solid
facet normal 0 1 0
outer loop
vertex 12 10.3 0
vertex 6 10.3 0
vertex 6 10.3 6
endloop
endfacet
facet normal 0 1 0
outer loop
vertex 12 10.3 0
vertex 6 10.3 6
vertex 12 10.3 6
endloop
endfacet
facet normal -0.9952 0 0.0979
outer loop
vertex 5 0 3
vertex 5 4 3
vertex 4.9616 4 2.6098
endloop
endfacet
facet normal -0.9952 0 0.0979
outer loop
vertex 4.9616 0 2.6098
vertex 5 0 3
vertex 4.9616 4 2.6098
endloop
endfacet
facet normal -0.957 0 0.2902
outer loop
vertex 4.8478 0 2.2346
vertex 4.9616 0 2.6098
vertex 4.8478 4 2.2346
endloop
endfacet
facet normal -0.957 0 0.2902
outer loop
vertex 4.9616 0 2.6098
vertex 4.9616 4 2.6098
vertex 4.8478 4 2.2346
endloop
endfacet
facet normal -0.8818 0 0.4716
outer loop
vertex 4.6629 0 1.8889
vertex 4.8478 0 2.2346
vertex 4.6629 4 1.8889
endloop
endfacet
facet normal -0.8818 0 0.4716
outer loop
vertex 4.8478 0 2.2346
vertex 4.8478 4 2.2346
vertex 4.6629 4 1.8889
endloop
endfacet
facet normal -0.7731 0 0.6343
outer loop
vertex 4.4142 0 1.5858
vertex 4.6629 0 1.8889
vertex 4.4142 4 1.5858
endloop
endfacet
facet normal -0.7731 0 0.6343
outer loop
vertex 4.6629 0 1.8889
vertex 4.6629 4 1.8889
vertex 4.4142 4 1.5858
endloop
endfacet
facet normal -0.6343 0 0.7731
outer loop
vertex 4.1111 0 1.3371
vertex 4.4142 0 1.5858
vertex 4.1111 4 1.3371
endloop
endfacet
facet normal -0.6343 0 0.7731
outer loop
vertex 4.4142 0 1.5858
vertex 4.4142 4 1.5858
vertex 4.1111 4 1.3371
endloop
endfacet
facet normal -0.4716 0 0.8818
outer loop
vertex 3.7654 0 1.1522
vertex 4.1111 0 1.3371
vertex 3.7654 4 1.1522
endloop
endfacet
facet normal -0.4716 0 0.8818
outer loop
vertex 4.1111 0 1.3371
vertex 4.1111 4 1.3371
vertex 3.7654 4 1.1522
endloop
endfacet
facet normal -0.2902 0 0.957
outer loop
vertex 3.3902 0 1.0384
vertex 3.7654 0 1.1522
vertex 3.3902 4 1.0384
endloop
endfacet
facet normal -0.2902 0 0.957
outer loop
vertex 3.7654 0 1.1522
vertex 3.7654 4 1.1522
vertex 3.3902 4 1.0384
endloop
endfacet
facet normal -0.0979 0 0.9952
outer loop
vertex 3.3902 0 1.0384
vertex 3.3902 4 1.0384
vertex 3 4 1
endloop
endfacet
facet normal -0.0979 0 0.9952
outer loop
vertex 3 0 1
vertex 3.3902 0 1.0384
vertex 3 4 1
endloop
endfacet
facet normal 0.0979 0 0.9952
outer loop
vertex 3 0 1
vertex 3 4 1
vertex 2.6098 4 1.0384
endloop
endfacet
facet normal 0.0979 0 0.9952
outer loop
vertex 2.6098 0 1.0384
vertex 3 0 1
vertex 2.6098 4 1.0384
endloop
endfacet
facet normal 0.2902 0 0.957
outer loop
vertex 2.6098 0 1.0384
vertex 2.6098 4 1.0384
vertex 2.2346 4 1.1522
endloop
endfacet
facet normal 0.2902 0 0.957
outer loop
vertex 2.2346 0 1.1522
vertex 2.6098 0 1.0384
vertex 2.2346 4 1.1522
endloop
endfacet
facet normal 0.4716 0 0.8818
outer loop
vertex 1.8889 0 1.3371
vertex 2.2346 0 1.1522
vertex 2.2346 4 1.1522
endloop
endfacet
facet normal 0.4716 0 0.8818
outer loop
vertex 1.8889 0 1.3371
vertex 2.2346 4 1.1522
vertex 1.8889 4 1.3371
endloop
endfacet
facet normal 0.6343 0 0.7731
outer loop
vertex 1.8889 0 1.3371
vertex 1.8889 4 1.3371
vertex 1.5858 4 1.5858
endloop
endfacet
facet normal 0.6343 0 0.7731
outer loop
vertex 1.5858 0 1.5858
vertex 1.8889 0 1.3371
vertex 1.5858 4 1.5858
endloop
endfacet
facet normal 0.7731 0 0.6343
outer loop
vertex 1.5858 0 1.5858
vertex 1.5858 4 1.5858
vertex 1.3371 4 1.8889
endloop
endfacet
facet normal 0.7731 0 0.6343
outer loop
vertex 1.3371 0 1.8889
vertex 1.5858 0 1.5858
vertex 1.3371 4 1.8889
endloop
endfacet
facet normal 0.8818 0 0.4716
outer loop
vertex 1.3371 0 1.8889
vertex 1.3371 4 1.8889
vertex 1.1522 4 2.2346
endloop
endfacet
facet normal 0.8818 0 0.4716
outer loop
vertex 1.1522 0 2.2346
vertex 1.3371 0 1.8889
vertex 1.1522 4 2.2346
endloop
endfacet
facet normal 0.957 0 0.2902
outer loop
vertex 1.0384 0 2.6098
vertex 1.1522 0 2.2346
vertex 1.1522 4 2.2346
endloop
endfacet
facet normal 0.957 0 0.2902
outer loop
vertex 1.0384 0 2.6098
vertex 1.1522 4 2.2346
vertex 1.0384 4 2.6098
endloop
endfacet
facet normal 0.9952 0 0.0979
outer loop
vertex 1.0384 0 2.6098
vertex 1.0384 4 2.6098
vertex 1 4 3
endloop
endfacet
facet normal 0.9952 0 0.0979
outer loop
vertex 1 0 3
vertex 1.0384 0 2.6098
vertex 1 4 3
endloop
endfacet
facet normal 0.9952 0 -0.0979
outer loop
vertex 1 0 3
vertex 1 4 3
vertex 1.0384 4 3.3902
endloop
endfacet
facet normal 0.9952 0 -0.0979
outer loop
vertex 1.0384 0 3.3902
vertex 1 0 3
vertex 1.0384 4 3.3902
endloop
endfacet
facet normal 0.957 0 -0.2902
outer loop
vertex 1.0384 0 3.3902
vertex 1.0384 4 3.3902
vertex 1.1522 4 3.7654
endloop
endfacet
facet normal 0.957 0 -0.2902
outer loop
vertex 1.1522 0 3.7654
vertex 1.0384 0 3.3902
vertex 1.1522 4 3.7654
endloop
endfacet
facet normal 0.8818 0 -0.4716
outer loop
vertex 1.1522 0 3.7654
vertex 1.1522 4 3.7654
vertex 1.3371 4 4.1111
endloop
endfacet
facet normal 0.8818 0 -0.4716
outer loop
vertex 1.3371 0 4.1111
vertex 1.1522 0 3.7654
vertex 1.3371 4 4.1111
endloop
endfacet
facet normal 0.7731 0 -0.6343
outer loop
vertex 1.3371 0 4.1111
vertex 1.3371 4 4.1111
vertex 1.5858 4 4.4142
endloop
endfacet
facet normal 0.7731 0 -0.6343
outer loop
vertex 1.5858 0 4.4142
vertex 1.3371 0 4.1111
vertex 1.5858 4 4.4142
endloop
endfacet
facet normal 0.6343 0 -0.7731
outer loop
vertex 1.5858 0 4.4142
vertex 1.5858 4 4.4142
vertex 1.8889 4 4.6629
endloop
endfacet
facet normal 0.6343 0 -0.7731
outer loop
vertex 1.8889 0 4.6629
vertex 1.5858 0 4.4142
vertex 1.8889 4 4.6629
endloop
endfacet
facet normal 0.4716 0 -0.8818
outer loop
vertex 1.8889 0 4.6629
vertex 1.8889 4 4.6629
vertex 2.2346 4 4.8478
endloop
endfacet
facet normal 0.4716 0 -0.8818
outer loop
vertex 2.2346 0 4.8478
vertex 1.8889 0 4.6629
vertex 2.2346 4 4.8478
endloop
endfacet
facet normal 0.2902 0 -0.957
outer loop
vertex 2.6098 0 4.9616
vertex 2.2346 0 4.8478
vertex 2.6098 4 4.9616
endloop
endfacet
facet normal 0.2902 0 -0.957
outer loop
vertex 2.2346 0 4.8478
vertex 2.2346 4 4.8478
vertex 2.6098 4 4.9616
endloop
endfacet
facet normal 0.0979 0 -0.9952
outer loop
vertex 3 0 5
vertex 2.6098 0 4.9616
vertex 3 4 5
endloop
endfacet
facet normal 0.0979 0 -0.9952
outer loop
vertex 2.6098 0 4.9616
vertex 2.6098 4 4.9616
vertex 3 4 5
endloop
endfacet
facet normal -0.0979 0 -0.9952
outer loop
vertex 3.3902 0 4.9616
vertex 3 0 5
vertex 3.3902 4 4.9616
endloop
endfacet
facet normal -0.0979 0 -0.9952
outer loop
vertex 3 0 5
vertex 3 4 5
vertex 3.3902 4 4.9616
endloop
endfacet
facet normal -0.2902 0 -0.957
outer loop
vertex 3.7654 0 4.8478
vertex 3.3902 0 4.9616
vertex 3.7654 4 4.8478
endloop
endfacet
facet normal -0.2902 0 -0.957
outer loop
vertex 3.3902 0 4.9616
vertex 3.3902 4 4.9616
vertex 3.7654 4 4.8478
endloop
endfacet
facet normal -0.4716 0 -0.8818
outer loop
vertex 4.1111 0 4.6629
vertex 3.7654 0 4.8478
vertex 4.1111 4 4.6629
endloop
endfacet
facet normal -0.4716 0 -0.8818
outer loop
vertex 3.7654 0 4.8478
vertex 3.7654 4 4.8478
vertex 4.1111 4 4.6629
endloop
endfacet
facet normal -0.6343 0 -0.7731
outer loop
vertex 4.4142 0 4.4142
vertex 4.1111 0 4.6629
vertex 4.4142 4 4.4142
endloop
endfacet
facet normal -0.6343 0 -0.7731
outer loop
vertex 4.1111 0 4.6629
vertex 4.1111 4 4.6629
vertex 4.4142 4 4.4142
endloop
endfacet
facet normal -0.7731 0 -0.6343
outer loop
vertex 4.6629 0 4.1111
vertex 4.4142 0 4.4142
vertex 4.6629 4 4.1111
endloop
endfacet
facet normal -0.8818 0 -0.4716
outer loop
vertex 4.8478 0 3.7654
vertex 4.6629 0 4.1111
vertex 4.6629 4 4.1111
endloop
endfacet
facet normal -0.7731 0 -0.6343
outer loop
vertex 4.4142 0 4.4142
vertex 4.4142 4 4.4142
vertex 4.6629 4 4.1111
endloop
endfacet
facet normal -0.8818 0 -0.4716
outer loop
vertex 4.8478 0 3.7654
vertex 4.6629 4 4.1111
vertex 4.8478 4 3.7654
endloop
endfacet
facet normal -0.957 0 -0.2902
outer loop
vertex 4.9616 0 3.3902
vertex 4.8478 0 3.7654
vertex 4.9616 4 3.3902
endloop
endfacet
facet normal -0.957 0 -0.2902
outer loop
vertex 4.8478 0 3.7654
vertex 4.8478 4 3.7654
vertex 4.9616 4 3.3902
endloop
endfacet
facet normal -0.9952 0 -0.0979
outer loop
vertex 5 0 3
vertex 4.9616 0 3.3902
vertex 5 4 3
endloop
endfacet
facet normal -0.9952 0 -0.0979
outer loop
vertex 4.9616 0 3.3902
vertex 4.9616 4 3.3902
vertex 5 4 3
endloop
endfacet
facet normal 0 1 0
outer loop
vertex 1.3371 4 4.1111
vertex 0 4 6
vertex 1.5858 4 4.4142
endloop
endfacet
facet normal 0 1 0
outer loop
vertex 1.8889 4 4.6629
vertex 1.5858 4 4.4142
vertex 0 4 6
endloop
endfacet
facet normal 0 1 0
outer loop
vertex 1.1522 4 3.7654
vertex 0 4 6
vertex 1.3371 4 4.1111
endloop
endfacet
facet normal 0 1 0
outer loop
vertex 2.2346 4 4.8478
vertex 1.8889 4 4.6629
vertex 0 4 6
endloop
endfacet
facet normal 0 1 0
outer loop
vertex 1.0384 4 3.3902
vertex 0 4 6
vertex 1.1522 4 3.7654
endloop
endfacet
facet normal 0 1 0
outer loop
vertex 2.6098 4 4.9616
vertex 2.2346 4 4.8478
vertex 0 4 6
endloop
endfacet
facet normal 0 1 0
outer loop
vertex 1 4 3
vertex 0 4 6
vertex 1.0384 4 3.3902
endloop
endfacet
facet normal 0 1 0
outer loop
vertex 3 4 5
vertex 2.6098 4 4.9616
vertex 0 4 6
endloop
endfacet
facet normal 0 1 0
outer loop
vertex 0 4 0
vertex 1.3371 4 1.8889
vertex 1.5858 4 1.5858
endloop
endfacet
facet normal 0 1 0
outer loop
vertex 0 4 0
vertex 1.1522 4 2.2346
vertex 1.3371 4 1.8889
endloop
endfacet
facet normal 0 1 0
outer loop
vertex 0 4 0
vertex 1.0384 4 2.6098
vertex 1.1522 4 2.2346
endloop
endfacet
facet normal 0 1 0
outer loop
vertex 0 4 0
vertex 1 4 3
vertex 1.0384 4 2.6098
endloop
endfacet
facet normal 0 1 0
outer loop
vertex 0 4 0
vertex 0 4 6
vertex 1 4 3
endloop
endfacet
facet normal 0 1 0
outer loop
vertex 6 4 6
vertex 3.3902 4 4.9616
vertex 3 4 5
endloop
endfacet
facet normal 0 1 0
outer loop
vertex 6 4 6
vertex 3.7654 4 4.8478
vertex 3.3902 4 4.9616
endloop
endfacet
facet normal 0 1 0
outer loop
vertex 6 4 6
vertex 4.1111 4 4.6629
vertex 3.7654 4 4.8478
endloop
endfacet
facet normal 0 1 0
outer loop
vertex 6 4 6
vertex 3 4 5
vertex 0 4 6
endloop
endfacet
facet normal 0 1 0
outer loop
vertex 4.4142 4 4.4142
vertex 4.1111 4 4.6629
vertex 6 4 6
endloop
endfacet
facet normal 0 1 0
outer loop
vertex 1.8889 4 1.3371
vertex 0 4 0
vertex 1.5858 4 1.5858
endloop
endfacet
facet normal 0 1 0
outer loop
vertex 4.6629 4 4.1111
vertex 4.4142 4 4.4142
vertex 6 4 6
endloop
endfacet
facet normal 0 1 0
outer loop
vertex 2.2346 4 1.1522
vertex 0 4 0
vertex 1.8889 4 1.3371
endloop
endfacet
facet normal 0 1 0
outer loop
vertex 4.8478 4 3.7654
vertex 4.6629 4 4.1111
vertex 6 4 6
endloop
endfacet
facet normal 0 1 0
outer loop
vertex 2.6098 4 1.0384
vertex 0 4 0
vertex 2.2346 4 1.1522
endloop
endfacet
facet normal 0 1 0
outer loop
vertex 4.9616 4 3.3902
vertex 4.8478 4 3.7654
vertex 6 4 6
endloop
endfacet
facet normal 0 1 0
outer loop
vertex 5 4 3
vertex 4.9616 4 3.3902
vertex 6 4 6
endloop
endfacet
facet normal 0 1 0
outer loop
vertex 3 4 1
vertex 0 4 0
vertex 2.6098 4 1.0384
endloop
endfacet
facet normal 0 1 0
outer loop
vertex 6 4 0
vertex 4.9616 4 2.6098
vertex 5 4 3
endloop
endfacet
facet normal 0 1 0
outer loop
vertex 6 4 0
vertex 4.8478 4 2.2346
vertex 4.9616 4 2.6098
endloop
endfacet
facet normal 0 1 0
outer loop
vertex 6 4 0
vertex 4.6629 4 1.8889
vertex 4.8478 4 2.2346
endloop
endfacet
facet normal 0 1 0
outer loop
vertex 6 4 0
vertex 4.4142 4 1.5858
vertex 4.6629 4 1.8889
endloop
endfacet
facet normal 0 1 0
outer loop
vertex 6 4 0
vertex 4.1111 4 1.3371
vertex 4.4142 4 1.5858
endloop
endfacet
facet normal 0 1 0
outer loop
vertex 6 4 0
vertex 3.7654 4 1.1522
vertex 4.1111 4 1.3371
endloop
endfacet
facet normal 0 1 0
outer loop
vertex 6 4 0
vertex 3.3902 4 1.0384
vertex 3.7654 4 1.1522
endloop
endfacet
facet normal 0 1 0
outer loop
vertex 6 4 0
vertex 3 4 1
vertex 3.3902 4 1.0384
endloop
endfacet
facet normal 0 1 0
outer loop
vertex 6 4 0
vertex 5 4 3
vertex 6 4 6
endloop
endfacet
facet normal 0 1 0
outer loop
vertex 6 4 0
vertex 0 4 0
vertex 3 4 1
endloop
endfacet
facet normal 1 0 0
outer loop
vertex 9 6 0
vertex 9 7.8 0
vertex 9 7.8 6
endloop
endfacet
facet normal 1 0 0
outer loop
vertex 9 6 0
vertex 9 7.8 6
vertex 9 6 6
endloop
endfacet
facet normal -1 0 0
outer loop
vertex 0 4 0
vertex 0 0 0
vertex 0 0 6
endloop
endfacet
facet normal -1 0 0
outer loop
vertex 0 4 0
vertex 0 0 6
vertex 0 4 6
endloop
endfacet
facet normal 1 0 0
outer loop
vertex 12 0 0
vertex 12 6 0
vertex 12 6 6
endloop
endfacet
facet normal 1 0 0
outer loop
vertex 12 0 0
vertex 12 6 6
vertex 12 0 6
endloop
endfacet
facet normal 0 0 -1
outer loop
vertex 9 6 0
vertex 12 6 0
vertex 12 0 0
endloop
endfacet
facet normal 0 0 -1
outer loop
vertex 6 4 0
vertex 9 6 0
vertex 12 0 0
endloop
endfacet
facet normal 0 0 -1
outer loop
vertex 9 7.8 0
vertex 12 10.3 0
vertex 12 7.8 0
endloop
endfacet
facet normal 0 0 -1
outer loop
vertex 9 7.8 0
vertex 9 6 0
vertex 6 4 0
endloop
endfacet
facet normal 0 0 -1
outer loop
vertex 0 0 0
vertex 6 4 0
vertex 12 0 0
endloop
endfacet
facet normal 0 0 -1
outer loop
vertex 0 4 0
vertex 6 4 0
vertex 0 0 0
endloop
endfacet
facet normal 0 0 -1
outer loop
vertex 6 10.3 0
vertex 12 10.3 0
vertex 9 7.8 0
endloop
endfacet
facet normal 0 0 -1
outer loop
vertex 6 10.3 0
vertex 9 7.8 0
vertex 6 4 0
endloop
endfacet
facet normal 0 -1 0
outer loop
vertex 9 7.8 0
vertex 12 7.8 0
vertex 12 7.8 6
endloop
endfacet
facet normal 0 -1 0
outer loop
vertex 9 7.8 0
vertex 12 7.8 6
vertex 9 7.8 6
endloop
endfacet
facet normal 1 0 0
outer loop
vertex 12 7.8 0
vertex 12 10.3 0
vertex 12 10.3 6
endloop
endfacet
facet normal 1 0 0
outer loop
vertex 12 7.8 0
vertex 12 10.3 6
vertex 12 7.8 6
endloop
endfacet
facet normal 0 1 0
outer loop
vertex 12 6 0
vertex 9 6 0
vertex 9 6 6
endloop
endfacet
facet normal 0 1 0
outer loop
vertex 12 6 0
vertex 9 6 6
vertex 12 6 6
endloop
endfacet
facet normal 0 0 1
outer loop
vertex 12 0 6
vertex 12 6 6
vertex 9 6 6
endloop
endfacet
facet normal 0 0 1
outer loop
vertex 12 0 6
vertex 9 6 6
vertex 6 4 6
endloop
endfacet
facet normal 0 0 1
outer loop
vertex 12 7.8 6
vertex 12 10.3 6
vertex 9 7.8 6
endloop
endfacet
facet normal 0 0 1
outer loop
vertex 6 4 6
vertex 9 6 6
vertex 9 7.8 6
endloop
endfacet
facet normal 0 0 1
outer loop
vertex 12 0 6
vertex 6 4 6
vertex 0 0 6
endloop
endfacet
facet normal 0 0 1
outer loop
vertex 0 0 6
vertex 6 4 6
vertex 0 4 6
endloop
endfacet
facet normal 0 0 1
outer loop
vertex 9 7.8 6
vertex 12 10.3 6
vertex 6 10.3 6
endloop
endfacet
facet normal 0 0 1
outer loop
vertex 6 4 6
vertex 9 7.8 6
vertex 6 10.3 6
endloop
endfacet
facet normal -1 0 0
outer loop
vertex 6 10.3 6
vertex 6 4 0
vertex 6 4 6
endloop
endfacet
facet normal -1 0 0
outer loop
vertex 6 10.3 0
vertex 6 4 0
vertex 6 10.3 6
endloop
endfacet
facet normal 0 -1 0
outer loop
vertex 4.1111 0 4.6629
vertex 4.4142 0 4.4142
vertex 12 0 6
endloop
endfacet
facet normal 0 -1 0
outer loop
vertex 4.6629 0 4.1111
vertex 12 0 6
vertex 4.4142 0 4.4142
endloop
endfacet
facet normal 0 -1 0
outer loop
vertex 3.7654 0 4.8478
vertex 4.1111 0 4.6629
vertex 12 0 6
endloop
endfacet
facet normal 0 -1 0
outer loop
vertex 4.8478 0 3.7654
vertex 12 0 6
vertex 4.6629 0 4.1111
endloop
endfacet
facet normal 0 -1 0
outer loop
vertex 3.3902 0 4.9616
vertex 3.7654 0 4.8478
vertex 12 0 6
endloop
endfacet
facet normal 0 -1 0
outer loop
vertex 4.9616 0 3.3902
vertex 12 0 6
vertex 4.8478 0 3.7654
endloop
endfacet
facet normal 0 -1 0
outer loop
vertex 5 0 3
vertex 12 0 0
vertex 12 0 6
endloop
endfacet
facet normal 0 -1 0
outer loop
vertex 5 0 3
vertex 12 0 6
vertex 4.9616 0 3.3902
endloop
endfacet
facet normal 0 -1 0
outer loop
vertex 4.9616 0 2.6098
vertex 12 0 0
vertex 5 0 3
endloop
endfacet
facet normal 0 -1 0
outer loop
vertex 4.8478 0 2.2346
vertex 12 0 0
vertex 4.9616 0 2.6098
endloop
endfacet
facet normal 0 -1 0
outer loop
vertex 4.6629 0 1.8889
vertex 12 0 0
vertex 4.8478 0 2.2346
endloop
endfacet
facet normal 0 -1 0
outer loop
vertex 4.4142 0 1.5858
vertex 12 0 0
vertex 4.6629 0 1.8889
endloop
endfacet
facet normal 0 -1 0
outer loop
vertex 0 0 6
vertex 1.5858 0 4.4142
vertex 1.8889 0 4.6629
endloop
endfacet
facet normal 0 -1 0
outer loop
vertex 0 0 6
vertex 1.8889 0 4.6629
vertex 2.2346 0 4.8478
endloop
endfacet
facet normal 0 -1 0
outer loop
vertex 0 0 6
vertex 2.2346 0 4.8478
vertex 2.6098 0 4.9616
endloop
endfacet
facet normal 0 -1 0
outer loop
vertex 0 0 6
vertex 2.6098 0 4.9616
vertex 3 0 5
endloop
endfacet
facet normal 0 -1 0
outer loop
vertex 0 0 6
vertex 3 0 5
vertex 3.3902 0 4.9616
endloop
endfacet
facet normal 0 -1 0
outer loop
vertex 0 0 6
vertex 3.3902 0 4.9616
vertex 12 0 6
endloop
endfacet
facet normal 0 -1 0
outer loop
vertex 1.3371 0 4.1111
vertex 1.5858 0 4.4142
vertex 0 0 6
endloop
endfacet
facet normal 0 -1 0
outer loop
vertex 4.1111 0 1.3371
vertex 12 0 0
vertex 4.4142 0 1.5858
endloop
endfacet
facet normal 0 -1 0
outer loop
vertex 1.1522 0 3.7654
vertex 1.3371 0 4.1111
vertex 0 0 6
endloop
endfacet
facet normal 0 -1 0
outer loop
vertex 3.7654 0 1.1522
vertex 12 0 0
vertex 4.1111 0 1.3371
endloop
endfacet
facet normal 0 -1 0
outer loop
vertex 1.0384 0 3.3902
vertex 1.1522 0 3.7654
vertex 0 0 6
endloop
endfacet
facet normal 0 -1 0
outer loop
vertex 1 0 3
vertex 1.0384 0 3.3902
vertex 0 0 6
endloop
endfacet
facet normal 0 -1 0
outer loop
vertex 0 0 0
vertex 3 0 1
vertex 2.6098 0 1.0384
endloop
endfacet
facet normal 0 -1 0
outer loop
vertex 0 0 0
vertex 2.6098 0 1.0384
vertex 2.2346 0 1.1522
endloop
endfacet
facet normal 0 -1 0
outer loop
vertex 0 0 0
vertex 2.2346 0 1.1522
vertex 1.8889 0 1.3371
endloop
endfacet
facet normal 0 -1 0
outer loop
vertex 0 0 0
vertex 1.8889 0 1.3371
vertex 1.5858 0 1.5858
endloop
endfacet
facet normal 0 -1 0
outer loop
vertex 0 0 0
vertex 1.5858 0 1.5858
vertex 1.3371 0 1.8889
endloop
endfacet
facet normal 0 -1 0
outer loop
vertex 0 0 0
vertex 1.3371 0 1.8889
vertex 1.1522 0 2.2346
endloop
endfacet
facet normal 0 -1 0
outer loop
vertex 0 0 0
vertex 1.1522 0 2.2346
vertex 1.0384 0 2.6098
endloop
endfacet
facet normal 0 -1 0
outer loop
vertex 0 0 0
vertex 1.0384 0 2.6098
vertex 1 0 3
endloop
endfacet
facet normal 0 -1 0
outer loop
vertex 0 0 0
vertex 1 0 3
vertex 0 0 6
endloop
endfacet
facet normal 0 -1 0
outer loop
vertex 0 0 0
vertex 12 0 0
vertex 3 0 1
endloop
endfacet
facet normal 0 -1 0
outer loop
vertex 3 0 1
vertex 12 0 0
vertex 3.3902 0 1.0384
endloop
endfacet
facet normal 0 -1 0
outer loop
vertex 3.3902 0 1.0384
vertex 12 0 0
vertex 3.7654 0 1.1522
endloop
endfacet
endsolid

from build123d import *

# Parameters (mm, degrees)
EXTRUDE_1_DEPTH     = 6
SKETCH_2_R          = 2
CUT_EXTRUDE_1_DEPTH = 5


with BuildPart() as part:
    # Эскиз1 → Бобышка-Вытянуть1 (new body)
    with BuildSketch(Plane.XY):
        Polygon((0, 0), (0, 4), (6, 4), (6, 10.3), (12, 10.3), (12, 7.8), (9, 7.8), (9, 6), (12, 6), (12, 0), align=None)
    extrude(amount=EXTRUDE_1_DEPTH)

    # Эскиз2 → Вырез-Вытянуть1 (cut, through all)
    with BuildSketch(Plane(origin=(0, 4, 0), x_dir=(1, 0, 0), z_dir=(0, 1, 0))):
        with Locations((3, -3)):
            Circle(SKETCH_2_R)
    extrude(amount=-CUT_EXTRUDE_1_DEPTH, mode=Mode.SUBTRACT)


solid = part.part
